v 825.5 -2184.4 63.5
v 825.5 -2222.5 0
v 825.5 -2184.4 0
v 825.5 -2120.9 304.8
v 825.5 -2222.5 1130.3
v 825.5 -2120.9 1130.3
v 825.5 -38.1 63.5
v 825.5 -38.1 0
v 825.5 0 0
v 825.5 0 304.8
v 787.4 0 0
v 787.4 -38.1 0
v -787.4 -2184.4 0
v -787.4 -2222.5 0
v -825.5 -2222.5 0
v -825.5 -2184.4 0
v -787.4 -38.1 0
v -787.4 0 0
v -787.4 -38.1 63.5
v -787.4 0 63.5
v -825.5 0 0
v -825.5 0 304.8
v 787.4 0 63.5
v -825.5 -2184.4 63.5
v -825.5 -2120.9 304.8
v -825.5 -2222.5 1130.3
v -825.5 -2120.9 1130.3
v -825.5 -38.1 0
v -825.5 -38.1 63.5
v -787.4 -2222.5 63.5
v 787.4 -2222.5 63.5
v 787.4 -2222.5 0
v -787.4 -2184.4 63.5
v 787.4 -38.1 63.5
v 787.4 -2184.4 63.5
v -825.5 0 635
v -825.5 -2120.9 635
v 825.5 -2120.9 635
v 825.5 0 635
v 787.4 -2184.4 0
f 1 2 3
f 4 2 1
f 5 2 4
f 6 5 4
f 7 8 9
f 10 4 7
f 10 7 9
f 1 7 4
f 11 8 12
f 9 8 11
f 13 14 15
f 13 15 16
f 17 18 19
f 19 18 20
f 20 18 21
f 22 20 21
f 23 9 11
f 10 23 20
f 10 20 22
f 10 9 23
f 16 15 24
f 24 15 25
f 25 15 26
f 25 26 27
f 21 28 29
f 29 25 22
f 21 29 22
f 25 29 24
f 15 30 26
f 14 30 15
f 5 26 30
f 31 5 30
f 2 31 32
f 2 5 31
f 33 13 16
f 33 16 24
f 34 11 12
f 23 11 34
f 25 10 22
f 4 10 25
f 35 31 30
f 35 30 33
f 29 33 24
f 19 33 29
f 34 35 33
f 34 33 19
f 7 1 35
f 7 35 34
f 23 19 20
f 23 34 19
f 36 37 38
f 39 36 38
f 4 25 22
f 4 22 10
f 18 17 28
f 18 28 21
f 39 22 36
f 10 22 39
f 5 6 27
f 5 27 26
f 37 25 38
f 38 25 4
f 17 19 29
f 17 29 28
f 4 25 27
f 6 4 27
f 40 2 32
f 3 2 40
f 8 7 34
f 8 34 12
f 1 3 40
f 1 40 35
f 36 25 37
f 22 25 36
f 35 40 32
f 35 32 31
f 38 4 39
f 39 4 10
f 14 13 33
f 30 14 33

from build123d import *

# Parameters (mm, degrees)
F1_DEPTH = 825.5
F2_W     = 1574.8
F2_H     = 63.5
F3_DEPTH = 2222.501
F4_W     = 1651
F4_H     = 2120.9
F5_DEPTH = 330.2


with BuildPart() as f1:
    # F0 (on Right) → F1 (new body, symmetric)
    with BuildSketch(Plane.YZ):
        Polygon((-38.1, 0), (0, 0), (0, 304.8), (-2120.9, 304.8), (-2120.9, 1130.3), (-2222.5, 1130.3), (-2222.5, 0), (-2184.4, 0), (-2184.4, 63.5), (-38.1, 63.5), align=None)
    extrude(amount=F1_DEPTH, both=True)

    # F2 (on face) → F3 (cut, through all)
    with BuildSketch(Plane(origin=(0, 0, 0), x_dir=(-1, 0, 0), z_dir=(0, 1, 0))):
        with Locations((0, 31.75)):
            Rectangle(F2_W, F2_H)
    extrude(amount=-F3_DEPTH, mode=Mode.SUBTRACT)


with BuildPart() as f5:
    # F4 (on face) → F5 (new body)
    with BuildSketch(Plane.XY.offset(304.8)):
        with Locations((0, -1060.45)):
            Rectangle(F4_W, F4_H)
    extrude(amount=F5_DEPTH)


solid = Compound([f1.part, f5.part])
